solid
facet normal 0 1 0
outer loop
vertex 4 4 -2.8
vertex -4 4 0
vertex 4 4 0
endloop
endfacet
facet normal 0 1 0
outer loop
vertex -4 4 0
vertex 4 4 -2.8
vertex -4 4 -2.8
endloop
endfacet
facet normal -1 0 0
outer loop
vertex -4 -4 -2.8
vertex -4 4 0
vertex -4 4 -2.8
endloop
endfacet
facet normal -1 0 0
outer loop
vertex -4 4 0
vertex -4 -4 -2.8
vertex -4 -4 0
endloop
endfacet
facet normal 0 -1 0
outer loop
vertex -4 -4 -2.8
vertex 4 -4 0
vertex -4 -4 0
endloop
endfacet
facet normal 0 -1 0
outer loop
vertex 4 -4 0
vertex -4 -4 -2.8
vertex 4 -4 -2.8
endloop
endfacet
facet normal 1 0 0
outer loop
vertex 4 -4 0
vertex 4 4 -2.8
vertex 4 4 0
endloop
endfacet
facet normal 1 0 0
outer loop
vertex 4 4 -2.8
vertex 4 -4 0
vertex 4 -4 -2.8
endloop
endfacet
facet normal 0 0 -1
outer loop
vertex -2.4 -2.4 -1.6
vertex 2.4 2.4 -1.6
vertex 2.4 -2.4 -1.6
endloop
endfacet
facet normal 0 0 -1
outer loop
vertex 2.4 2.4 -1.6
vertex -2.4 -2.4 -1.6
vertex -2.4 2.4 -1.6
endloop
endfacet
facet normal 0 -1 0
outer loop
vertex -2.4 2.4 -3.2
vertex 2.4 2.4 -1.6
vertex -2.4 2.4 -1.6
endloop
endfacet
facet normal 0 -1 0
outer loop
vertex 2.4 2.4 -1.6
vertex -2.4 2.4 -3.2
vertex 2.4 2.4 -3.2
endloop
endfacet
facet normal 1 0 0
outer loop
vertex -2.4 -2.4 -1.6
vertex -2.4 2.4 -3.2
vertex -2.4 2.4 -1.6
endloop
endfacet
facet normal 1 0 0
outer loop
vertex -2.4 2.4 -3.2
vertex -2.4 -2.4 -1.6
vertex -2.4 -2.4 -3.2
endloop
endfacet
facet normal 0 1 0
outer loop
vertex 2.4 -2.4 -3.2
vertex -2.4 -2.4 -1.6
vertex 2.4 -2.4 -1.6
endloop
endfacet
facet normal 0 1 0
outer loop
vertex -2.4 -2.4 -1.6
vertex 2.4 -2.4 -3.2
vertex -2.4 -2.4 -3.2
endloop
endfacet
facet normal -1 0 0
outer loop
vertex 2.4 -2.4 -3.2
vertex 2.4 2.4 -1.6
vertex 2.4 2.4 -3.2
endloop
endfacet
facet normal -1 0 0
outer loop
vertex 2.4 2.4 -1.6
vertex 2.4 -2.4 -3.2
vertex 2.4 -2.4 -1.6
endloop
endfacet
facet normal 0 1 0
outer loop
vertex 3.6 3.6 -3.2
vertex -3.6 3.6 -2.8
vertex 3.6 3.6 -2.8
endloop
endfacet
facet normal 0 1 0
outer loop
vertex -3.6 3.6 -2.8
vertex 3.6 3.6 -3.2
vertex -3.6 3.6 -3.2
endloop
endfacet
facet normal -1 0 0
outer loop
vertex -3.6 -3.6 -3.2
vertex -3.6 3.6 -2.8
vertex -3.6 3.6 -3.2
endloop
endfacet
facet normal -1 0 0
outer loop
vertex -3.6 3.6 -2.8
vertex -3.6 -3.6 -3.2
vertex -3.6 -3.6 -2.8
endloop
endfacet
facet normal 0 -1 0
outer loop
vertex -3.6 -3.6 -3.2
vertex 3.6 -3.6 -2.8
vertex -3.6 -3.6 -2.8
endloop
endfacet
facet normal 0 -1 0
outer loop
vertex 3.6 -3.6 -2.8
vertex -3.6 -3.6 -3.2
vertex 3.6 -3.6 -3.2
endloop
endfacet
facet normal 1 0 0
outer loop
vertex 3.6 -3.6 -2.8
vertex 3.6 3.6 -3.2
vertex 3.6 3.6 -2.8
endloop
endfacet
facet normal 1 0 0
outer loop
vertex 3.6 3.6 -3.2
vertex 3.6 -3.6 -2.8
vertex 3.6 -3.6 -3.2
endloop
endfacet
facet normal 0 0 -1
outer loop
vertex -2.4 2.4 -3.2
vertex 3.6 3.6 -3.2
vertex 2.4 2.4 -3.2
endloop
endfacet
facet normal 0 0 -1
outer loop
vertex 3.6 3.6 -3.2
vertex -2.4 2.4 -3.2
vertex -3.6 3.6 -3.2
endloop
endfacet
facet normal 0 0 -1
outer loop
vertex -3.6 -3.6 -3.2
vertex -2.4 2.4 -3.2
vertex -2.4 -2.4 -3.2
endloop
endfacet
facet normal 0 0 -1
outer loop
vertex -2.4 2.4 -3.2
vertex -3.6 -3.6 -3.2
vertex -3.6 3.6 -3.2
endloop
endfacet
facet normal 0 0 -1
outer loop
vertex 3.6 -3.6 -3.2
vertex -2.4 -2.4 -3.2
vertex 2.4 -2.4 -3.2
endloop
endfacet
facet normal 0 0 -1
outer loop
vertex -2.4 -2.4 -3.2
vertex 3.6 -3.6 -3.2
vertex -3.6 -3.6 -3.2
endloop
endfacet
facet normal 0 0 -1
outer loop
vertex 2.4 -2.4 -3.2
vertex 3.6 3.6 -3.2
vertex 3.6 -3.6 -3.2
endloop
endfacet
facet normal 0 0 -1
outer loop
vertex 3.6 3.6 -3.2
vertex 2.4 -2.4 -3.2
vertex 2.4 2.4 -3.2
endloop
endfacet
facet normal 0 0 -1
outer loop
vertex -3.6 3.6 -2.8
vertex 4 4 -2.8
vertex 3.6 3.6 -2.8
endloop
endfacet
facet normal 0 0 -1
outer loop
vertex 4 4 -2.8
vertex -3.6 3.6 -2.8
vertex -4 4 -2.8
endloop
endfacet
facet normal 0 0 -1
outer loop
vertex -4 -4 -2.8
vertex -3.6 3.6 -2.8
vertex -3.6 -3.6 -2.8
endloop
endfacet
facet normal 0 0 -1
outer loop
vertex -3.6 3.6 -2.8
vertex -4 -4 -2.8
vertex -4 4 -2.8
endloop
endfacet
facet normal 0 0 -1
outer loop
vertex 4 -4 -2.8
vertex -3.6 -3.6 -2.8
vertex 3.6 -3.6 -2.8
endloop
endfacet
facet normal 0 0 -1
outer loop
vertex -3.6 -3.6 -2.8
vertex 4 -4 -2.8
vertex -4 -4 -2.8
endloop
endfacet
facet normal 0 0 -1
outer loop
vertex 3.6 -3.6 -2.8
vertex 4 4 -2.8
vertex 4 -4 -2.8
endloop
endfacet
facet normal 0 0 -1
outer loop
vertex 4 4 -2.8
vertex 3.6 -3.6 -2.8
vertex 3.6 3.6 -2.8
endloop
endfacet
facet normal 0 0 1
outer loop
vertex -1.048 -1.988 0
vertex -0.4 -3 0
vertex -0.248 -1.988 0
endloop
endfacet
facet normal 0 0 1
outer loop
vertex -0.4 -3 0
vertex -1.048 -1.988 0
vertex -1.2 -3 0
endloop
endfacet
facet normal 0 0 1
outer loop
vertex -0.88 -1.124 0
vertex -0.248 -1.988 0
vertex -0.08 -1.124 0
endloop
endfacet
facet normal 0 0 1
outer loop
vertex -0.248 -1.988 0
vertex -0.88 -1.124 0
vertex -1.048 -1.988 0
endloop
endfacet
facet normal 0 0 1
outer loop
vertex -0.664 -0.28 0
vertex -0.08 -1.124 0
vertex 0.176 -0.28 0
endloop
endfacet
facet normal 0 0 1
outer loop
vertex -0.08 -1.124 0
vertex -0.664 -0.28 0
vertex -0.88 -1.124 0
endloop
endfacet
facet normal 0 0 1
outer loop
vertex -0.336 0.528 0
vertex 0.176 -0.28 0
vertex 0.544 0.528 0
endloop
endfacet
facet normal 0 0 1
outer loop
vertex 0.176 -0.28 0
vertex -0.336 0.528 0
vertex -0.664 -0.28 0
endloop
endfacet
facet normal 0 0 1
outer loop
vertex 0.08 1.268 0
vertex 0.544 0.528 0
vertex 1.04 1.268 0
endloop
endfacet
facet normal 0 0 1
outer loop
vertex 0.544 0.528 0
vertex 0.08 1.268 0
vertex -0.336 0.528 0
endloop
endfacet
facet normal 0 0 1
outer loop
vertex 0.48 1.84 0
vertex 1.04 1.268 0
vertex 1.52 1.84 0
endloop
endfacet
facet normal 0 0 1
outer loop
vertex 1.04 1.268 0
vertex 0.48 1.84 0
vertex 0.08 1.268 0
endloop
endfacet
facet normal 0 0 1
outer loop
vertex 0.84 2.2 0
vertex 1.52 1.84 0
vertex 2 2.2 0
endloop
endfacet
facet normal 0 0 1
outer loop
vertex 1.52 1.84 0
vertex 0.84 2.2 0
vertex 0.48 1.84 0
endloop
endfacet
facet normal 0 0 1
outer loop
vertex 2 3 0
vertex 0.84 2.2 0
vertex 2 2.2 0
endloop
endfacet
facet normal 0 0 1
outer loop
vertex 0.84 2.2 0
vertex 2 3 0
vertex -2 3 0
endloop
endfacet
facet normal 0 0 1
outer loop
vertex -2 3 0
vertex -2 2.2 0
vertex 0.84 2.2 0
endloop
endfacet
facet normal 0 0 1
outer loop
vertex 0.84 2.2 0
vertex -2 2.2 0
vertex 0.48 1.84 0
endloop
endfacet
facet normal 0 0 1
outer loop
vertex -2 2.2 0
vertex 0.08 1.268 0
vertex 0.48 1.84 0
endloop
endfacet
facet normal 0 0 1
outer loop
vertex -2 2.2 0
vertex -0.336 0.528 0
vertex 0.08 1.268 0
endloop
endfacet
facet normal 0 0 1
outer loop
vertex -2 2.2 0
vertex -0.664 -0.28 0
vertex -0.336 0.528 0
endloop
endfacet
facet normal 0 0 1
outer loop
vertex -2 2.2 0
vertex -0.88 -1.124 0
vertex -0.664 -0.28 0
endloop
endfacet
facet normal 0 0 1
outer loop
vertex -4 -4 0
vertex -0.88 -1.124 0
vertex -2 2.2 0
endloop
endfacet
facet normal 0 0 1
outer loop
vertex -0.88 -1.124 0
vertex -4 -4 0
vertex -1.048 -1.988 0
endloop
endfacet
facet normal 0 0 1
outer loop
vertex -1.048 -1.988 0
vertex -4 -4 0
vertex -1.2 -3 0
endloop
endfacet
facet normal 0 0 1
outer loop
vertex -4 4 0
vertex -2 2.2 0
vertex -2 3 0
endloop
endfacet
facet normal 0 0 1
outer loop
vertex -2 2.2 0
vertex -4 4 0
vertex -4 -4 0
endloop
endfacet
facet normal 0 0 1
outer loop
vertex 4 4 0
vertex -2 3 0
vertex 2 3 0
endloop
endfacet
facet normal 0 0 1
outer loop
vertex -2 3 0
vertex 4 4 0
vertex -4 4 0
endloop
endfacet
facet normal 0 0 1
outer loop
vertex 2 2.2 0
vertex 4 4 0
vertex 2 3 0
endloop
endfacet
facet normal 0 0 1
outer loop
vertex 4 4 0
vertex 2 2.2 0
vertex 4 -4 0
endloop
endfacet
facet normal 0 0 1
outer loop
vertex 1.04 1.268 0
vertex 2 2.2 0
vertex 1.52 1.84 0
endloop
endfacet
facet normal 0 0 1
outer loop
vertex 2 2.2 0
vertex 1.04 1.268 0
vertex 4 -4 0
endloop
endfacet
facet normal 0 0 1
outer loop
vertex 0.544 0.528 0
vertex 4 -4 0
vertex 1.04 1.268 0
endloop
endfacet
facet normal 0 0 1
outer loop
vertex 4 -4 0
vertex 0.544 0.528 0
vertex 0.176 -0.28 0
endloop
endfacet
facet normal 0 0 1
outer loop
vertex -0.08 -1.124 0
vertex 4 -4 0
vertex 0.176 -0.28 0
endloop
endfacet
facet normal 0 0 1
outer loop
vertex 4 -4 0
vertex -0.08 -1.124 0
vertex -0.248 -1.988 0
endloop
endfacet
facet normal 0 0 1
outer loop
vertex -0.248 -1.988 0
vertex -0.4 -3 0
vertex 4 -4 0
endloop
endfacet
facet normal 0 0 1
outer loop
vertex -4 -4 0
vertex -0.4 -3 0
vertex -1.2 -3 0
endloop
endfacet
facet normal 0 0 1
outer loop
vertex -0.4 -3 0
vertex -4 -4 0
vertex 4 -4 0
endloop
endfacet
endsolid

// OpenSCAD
// file: ../p/box5.scad
use <../lib.scad>
function ldraw_lib__box5() = [
// 0 Box with 5 Faces and All Edges
// 0 Name: box5.dat
// 0 Author: James Jessiman
// 0 !LDRAW_ORG Primitive UPDATE 2012-01
// 0 !LICENSE Licensed under CC BY 4.0 : see CAreadme.txt
// 
// 0 BFC CERTIFY CCW
  [0,"BFC","CERTIFY"],
  [0,"BFC","CCW"],
// 
// 0 !HISTORY 2002-04-03 [sbliss] Modified for BFC compliance
// 0 !HISTORY 2002-04-25 [PTadmin] Official Update 2002-02
// 0 !HISTORY 2007-06-24 [PTadmin] Header formatted for Contributor Agreement
// 0 !HISTORY 2008-07-01 [PTadmin] Official Update 2008-01
// 0 !HISTORY 2012-02-16 [Philo] Changed to CCW
// 0 !HISTORY 2012-03-30 [PTadmin] Official Update 2012-01
// 
// 
// 2 24 1 1 1 -1 1 1
  [2,24,1,1,1,-1,1,1],
// 2 24 -1 1 1 -1 1 -1
  [2,24,-1,1,1,-1,1,-1],
// 2 24 -1 1 -1 1 1 -1
  [2,24,-1,1,-1,1,1,-1],
// 2 24 1 1 -1 1 1 1
  [2,24,1,1,-1,1,1,1],
// 2 24 1 0 1 -1 0 1
  [2,24,1,0,1,-1,0,1],
// 2 24 -1 0 1 -1 0 -1
  [2,24,-1,0,1,-1,0,-1],
// 2 24 -1 0 -1 1 0 -1
  [2,24,-1,0,-1,1,0,-1],
// 2 24 1 0 -1 1 0 1
  [2,24,1,0,-1,1,0,1],
// 2 24 1 0 1 1 1 1
  [2,24,1,0,1,1,1,1],
// 2 24 -1 0 1 -1 1 1
  [2,24,-1,0,1,-1,1,1],
// 2 24 1 0 -1 1 1 -1
  [2,24,1,0,-1,1,1,-1],
// 2 24 -1 0 -1 -1 1 -1
  [2,24,-1,0,-1,-1,1,-1],
// 4 16 -1 1 1 1 1 1 1 1 -1 -1 1 -1
  [4,16,-1,1,1,1,1,1,1,1,-1,-1,1,-1],
// 4 16 -1 1 1 -1 0 1 1 0 1 1 1 1
  [4,16,-1,1,1,-1,0,1,1,0,1,1,1,1],
// 4 16 -1 1 -1 -1 0 -1 -1 0 1 -1 1 1
  [4,16,-1,1,-1,-1,0,-1,-1,0,1,-1,1,1],
// 4 16 1 1 -1 1 0 -1 -1 0 -1 -1 1 -1
  [4,16,1,1,-1,1,0,-1,-1,0,-1,-1,1,-1],
// 4 16 1 1 1 1 0 1 1 0 -1 1 1 -1
  [4,16,1,1,1,1,0,1,1,0,-1,1,1,-1],
];
module ldraw_lib__box5(step=0, col=false, unit=2/5, alt=false, line=0.2, solid=!$preview)
    makepoly(ldraw_lib__box5(), step=step, col=col, unit=unit, alt=alt, line=line, solid=solid);
ldraw_lib__box5(line=0.2);
// file: ../p/box4.scad
use <../lib.scad>
function ldraw_lib__box4() = [
// 0 Box with 4 Faces (2 Parallel Pairs) and All Edges
// 0 Name: box4.dat
// 0 Author: James Jessiman
// 0 !LDRAW_ORG Primitive UPDATE 2012-01
// 0 !LICENSE Licensed under CC BY 4.0 : see CAreadme.txt
// 
// 0 BFC CERTIFY CCW
  [0,"BFC","CERTIFY"],
  [0,"BFC","CCW"],
// 
// 0 !HISTORY 2002-04-03 [sbliss] Modified for BFC compliance
// 0 !HISTORY 2002-04-25 [PTadmin] Official Update 2002-02
// 0 !HISTORY 2007-06-24 [PTadmin] Header formatted for Contributor Agreement
// 0 !HISTORY 2008-07-01 [PTadmin] Official Update 2008-01
// 0 !HISTORY 2012-02-16 [Philo] Changed to CCW
// 0 !HISTORY 2012-03-30 [PTadmin] Official Update 2012-01
// 
// 
// 2 24 1 1 1 -1 1 1
  [2,24,1,1,1,-1,1,1],
// 2 24 -1 1 1 -1 1 -1
  [2,24,-1,1,1,-1,1,-1],
// 2 24 -1 1 -1 1 1 -1
  [2,24,-1,1,-1,1,1,-1],
// 2 24 1 1 -1 1 1 1
  [2,24,1,1,-1,1,1,1],
// 2 24 1 0 1 -1 0 1
  [2,24,1,0,1,-1,0,1],
// 2 24 -1 0 1 -1 0 -1
  [2,24,-1,0,1,-1,0,-1],
// 2 24 -1 0 -1 1 0 -1
  [2,24,-1,0,-1,1,0,-1],
// 2 24 1 0 -1 1 0 1
  [2,24,1,0,-1,1,0,1],
// 2 24 1 0 1 1 1 1
  [2,24,1,0,1,1,1,1],
// 2 24 -1 0 1 -1 1 1
  [2,24,-1,0,1,-1,1,1],
// 2 24 1 0 -1 1 1 -1
  [2,24,1,0,-1,1,1,-1],
// 2 24 -1 0 -1 -1 1 -1
  [2,24,-1,0,-1,-1,1,-1],
// 4 16 -1 1 1 -1 0 1 1 0 1 1 1 1
  [4,16,-1,1,1,-1,0,1,1,0,1,1,1,1],
// 4 16 -1 1 -1 -1 0 -1 -1 0 1 -1 1 1
  [4,16,-1,1,-1,-1,0,-1,-1,0,1,-1,1,1],
// 4 16 1 1 -1 1 0 -1 -1 0 -1 -1 1 -1
  [4,16,1,1,-1,1,0,-1,-1,0,-1,-1,1,-1],
// 4 16 1 1 1 1 0 1 1 0 -1 1 1 -1
  [4,16,1,1,1,1,0,1,1,0,-1,1,1,-1],
];
module ldraw_lib__box4(step=0, col=false, unit=2/5, alt=false, line=0.2, solid=!$preview)
    makepoly(ldraw_lib__box4(), step=step, col=col, unit=unit, alt=alt, line=line, solid=solid);
ldraw_lib__box4(line=0.2);
// file: s/3070bs01.scad
use <../../lib.scad>
use <../../p/box4.scad>
use <../../p/box5.scad>
function ldraw_lib__s__3070bs01() = [
// 0 ~Tile  1 x  1 with Groove without Top Face
// 0 Name: s\3070bs01.dat
// 0 Author: Chris Dee [cwdee]
// 0 !LDRAW_ORG Subpart UPDATE 2009-02
// 0 !LICENSE Licensed under CC BY 4.0 : see CAreadme.txt
// 
// 0 BFC CERTIFY CCW
  [0,"BFC","CERTIFY"],
  [0,"BFC","CCW"],
// 
// 0 !HISTORY 2009-09-03 [PTadmin] Official Update 2009-02
// 
// 
// 1 16 0 0 0 10 0 0 0 7 0 0 0 10 box4.dat
  [1,16,0,0,0,10,0,0,0,7,0,0,0,10, ldraw_lib__box4()],
// 0 BFC INVERTNEXT
  [0,"BFC","INVERTNEXT"],
// 1 16 0 8 0 6 0 0 0 -4 0 0 0 6 box5.dat
  [1,16,0,8,0,6,0,0,0,-4,0,0,0,6, ldraw_lib__box5()],
// 1 16 0 7 0 9 0 0 0 1 0 0 0 9 box4.dat
  [1,16,0,7,0,9,0,0,0,1,0,0,0,9, ldraw_lib__box4()],
// 
// 4 16 9 8 9 6 8 6 -6 8 6 -9 8 9
  [4,16,9,8,9,6,8,6,-6,8,6,-9,8,9],
// 4 16 -9 8 9 -6 8 6 -6 8 -6 -9 8 -9
  [4,16,-9,8,9,-6,8,6,-6,8,-6,-9,8,-9],
// 4 16 -9 8 -9 -6 8 -6 6 8 -6 9 8 -9
  [4,16,-9,8,-9,-6,8,-6,6,8,-6,9,8,-9],
// 4 16 9 8 -9 6 8 -6 6 8 6 9 8 9
  [4,16,9,8,-9,6,8,-6,6,8,6,9,8,9],
// 
// 4 16 10 7 10 9 7 9 -9 7 9 -10 7 10
  [4,16,10,7,10,9,7,9,-9,7,9,-10,7,10],
// 4 16 -10 7 10 -9 7 9 -9 7 -9 -10 7 -10
  [4,16,-10,7,10,-9,7,9,-9,7,-9,-10,7,-10],
// 4 16 -10 7 -10 -9 7 -9 9 7 -9 10 7 -10
  [4,16,-10,7,-10,-9,7,-9,9,7,-9,10,7,-10],
// 4 16 10 7 -10 9 7 -9 9 7 9 10 7 10
  [4,16,10,7,-10,9,7,-9,9,7,9,10,7,10],
// 0
];
module ldraw_lib__s__3070bs01(step=0, col=false, unit=2/5, alt=false, line=0.2, solid=!$preview)
    makepoly(ldraw_lib__s__3070bs01(), step=step, col=col, unit=unit, alt=alt, line=line, solid=solid);
ldraw_lib__s__3070bs01(line=0.2);
// main file
use <../lib.scad>
use <s/3070bs01.scad>
function ldraw_lib__3070bpv7() = [
// 0 Tile  1 x  1 with Silver "7" Pattern
// 0 Name: 3070bpv7.dat
// 0 Author: Magnus Forsberg [MagFors]
// 0 !LDRAW_ORG Part UPDATE 2015-02
// 0 !LICENSE Licensed under CC BY 4.0 : see CAreadme.txt
// 
// 0 BFC CERTIFY CCW
  [0,"BFC","CERTIFY"],
  [0,"BFC","CCW"],
// 
// 0 !KEYWORDS BrickLink 3070pb067, Rebrickable 3070bpr0095, Set 850425
// 
// 0 !HISTORY 2015-12-30 [PTadmin] Official Update 2015-02
// 
// 
// 1 16 0 0 0 1 0 0 0 1 0 0 0 1 s\3070bs01.dat
  [1,16,0,0,0,1,0,0,0,1,0,0,0,1, ldraw_lib__s__3070bs01()],
// 
// 4 80 -2.62 0 -4.97 -3 0 -7.5 -1 0 -7.5 -0.62 0 -4.97
  [4,80,-2.62,0,-4.97,-3,0,-7.5,-1,0,-7.5,-0.62,0,-4.97],
// 4 80 -2.2 0 -2.81 -2.62 0 -4.97 -0.62 0 -4.97 -0.2 0 -2.81
  [4,80,-2.2,0,-2.81,-2.62,0,-4.97,-0.62,0,-4.97,-0.2,0,-2.81],
// 4 80 -1.66 0 -0.7 -2.2 0 -2.81 -0.2 0 -2.81 0.44 0 -0.7
  [4,80,-1.66,0,-0.7,-2.2,0,-2.81,-0.2,0,-2.81,0.44,0,-0.7],
// 4 80 -0.84 0 1.32 -1.66 0 -0.7 0.44 0 -0.7 1.36 0 1.32
  [4,80,-0.84,0,1.32,-1.66,0,-0.7,0.44,0,-0.7,1.36,0,1.32],
// 4 80 0.2 0 3.17 -0.84 0 1.32 1.36 0 1.32 2.6 0 3.17
  [4,80,0.2,0,3.17,-0.84,0,1.32,1.36,0,1.32,2.6,0,3.17],
// 4 80 1.2 0 4.6 0.2 0 3.17 2.6 0 3.17 3.8 0 4.6
  [4,80,1.2,0,4.6,0.2,0,3.17,2.6,0,3.17,3.8,0,4.6],
// 4 80 2.1 0 5.5 1.2 0 4.6 3.8 0 4.6 5 0 5.5
  [4,80,2.1,0,5.5,1.2,0,4.6,3.8,0,4.6,5,0,5.5],
// 4 80 2.1 0 5.5 5 0 5.5 5 0 7.5 -5 0 7.5
  [4,80,2.1,0,5.5,5,0,5.5,5,0,7.5,-5,0,7.5],
// 3 80 -5 0 7.5 -5 0 5.5 2.1 0 5.5
  [3,80,-5,0,7.5,-5,0,5.5,2.1,0,5.5],
// 
// 3 16 2.1 0 5.5 -5 0 5.5 1.2 0 4.6
  [3,16,2.1,0,5.5,-5,0,5.5,1.2,0,4.6],
// 3 16 -5 0 5.5 0.2 0 3.17 1.2 0 4.6
  [3,16,-5,0,5.5,0.2,0,3.17,1.2,0,4.6],
// 3 16 -5 0 5.5 -0.84 0 1.32 0.2 0 3.17
  [3,16,-5,0,5.5,-0.84,0,1.32,0.2,0,3.17],
// 3 16 -5 0 5.5 -1.66 0 -0.7 -0.84 0 1.32
  [3,16,-5,0,5.5,-1.66,0,-0.7,-0.84,0,1.32],
// 3 16 -5 0 5.5 -2.2 0 -2.81 -1.66 0 -0.7
  [3,16,-5,0,5.5,-2.2,0,-2.81,-1.66,0,-0.7],
// 4 16 -2.62 0 -4.97 -2.2 0 -2.81 -5 0 5.5 -10 0 -10
  [4,16,-2.62,0,-4.97,-2.2,0,-2.81,-5,0,5.5,-10,0,-10],
// 3 16 -2.62 0 -4.97 -10 0 -10 -3 0 -7.5
  [3,16,-2.62,0,-4.97,-10,0,-10,-3,0,-7.5],
// 4 16 -5 0 7.5 -10 0 10 -10 0 -10 -5 0 5.5
  [4,16,-5,0,7.5,-10,0,10,-10,0,-10,-5,0,5.5],
// 4 16 -10 0 10 -5 0 7.5 5 0 7.5 10 0 10
  [4,16,-10,0,10,-5,0,7.5,5,0,7.5,10,0,10],
// 4 16 5 0 7.5 5 0 5.5 10 0 -10 10 0 10
  [4,16,5,0,7.5,5,0,5.5,10,0,-10,10,0,10],
// 4 16 10 0 -10 5 0 5.5 3.8 0 4.6 2.6 0 3.17
  [4,16,10,0,-10,5,0,5.5,3.8,0,4.6,2.6,0,3.17],
// 4 16 10 0 -10 2.6 0 3.17 1.36 0 1.32 0.44 0 -0.7
  [4,16,10,0,-10,2.6,0,3.17,1.36,0,1.32,0.44,0,-0.7],
// 4 16 10 0 -10 0.44 0 -0.7 -0.2 0 -2.81 -0.62 0 -4.97
  [4,16,10,0,-10,0.44,0,-0.7,-0.2,0,-2.81,-0.62,0,-4.97],
// 3 16 -0.62 0 -4.97 -1 0 -7.5 10 0 -10
  [3,16,-0.62,0,-4.97,-1,0,-7.5,10,0,-10],
// 4 16 -3 0 -7.5 -10 0 -10 10 0 -10 -1 0 -7.5
  [4,16,-3,0,-7.5,-10,0,-10,10,0,-10,-1,0,-7.5],
];
module ldraw_lib__3070bpv7(step=0, col=false, unit=2/5, alt=false, line=0.2, solid=!$preview)
    makepoly(ldraw_lib__3070bpv7(), step=step, col=col, unit=unit, alt=alt, line=line, solid=solid);
ldraw_lib__3070bpv7(line=0.2);
